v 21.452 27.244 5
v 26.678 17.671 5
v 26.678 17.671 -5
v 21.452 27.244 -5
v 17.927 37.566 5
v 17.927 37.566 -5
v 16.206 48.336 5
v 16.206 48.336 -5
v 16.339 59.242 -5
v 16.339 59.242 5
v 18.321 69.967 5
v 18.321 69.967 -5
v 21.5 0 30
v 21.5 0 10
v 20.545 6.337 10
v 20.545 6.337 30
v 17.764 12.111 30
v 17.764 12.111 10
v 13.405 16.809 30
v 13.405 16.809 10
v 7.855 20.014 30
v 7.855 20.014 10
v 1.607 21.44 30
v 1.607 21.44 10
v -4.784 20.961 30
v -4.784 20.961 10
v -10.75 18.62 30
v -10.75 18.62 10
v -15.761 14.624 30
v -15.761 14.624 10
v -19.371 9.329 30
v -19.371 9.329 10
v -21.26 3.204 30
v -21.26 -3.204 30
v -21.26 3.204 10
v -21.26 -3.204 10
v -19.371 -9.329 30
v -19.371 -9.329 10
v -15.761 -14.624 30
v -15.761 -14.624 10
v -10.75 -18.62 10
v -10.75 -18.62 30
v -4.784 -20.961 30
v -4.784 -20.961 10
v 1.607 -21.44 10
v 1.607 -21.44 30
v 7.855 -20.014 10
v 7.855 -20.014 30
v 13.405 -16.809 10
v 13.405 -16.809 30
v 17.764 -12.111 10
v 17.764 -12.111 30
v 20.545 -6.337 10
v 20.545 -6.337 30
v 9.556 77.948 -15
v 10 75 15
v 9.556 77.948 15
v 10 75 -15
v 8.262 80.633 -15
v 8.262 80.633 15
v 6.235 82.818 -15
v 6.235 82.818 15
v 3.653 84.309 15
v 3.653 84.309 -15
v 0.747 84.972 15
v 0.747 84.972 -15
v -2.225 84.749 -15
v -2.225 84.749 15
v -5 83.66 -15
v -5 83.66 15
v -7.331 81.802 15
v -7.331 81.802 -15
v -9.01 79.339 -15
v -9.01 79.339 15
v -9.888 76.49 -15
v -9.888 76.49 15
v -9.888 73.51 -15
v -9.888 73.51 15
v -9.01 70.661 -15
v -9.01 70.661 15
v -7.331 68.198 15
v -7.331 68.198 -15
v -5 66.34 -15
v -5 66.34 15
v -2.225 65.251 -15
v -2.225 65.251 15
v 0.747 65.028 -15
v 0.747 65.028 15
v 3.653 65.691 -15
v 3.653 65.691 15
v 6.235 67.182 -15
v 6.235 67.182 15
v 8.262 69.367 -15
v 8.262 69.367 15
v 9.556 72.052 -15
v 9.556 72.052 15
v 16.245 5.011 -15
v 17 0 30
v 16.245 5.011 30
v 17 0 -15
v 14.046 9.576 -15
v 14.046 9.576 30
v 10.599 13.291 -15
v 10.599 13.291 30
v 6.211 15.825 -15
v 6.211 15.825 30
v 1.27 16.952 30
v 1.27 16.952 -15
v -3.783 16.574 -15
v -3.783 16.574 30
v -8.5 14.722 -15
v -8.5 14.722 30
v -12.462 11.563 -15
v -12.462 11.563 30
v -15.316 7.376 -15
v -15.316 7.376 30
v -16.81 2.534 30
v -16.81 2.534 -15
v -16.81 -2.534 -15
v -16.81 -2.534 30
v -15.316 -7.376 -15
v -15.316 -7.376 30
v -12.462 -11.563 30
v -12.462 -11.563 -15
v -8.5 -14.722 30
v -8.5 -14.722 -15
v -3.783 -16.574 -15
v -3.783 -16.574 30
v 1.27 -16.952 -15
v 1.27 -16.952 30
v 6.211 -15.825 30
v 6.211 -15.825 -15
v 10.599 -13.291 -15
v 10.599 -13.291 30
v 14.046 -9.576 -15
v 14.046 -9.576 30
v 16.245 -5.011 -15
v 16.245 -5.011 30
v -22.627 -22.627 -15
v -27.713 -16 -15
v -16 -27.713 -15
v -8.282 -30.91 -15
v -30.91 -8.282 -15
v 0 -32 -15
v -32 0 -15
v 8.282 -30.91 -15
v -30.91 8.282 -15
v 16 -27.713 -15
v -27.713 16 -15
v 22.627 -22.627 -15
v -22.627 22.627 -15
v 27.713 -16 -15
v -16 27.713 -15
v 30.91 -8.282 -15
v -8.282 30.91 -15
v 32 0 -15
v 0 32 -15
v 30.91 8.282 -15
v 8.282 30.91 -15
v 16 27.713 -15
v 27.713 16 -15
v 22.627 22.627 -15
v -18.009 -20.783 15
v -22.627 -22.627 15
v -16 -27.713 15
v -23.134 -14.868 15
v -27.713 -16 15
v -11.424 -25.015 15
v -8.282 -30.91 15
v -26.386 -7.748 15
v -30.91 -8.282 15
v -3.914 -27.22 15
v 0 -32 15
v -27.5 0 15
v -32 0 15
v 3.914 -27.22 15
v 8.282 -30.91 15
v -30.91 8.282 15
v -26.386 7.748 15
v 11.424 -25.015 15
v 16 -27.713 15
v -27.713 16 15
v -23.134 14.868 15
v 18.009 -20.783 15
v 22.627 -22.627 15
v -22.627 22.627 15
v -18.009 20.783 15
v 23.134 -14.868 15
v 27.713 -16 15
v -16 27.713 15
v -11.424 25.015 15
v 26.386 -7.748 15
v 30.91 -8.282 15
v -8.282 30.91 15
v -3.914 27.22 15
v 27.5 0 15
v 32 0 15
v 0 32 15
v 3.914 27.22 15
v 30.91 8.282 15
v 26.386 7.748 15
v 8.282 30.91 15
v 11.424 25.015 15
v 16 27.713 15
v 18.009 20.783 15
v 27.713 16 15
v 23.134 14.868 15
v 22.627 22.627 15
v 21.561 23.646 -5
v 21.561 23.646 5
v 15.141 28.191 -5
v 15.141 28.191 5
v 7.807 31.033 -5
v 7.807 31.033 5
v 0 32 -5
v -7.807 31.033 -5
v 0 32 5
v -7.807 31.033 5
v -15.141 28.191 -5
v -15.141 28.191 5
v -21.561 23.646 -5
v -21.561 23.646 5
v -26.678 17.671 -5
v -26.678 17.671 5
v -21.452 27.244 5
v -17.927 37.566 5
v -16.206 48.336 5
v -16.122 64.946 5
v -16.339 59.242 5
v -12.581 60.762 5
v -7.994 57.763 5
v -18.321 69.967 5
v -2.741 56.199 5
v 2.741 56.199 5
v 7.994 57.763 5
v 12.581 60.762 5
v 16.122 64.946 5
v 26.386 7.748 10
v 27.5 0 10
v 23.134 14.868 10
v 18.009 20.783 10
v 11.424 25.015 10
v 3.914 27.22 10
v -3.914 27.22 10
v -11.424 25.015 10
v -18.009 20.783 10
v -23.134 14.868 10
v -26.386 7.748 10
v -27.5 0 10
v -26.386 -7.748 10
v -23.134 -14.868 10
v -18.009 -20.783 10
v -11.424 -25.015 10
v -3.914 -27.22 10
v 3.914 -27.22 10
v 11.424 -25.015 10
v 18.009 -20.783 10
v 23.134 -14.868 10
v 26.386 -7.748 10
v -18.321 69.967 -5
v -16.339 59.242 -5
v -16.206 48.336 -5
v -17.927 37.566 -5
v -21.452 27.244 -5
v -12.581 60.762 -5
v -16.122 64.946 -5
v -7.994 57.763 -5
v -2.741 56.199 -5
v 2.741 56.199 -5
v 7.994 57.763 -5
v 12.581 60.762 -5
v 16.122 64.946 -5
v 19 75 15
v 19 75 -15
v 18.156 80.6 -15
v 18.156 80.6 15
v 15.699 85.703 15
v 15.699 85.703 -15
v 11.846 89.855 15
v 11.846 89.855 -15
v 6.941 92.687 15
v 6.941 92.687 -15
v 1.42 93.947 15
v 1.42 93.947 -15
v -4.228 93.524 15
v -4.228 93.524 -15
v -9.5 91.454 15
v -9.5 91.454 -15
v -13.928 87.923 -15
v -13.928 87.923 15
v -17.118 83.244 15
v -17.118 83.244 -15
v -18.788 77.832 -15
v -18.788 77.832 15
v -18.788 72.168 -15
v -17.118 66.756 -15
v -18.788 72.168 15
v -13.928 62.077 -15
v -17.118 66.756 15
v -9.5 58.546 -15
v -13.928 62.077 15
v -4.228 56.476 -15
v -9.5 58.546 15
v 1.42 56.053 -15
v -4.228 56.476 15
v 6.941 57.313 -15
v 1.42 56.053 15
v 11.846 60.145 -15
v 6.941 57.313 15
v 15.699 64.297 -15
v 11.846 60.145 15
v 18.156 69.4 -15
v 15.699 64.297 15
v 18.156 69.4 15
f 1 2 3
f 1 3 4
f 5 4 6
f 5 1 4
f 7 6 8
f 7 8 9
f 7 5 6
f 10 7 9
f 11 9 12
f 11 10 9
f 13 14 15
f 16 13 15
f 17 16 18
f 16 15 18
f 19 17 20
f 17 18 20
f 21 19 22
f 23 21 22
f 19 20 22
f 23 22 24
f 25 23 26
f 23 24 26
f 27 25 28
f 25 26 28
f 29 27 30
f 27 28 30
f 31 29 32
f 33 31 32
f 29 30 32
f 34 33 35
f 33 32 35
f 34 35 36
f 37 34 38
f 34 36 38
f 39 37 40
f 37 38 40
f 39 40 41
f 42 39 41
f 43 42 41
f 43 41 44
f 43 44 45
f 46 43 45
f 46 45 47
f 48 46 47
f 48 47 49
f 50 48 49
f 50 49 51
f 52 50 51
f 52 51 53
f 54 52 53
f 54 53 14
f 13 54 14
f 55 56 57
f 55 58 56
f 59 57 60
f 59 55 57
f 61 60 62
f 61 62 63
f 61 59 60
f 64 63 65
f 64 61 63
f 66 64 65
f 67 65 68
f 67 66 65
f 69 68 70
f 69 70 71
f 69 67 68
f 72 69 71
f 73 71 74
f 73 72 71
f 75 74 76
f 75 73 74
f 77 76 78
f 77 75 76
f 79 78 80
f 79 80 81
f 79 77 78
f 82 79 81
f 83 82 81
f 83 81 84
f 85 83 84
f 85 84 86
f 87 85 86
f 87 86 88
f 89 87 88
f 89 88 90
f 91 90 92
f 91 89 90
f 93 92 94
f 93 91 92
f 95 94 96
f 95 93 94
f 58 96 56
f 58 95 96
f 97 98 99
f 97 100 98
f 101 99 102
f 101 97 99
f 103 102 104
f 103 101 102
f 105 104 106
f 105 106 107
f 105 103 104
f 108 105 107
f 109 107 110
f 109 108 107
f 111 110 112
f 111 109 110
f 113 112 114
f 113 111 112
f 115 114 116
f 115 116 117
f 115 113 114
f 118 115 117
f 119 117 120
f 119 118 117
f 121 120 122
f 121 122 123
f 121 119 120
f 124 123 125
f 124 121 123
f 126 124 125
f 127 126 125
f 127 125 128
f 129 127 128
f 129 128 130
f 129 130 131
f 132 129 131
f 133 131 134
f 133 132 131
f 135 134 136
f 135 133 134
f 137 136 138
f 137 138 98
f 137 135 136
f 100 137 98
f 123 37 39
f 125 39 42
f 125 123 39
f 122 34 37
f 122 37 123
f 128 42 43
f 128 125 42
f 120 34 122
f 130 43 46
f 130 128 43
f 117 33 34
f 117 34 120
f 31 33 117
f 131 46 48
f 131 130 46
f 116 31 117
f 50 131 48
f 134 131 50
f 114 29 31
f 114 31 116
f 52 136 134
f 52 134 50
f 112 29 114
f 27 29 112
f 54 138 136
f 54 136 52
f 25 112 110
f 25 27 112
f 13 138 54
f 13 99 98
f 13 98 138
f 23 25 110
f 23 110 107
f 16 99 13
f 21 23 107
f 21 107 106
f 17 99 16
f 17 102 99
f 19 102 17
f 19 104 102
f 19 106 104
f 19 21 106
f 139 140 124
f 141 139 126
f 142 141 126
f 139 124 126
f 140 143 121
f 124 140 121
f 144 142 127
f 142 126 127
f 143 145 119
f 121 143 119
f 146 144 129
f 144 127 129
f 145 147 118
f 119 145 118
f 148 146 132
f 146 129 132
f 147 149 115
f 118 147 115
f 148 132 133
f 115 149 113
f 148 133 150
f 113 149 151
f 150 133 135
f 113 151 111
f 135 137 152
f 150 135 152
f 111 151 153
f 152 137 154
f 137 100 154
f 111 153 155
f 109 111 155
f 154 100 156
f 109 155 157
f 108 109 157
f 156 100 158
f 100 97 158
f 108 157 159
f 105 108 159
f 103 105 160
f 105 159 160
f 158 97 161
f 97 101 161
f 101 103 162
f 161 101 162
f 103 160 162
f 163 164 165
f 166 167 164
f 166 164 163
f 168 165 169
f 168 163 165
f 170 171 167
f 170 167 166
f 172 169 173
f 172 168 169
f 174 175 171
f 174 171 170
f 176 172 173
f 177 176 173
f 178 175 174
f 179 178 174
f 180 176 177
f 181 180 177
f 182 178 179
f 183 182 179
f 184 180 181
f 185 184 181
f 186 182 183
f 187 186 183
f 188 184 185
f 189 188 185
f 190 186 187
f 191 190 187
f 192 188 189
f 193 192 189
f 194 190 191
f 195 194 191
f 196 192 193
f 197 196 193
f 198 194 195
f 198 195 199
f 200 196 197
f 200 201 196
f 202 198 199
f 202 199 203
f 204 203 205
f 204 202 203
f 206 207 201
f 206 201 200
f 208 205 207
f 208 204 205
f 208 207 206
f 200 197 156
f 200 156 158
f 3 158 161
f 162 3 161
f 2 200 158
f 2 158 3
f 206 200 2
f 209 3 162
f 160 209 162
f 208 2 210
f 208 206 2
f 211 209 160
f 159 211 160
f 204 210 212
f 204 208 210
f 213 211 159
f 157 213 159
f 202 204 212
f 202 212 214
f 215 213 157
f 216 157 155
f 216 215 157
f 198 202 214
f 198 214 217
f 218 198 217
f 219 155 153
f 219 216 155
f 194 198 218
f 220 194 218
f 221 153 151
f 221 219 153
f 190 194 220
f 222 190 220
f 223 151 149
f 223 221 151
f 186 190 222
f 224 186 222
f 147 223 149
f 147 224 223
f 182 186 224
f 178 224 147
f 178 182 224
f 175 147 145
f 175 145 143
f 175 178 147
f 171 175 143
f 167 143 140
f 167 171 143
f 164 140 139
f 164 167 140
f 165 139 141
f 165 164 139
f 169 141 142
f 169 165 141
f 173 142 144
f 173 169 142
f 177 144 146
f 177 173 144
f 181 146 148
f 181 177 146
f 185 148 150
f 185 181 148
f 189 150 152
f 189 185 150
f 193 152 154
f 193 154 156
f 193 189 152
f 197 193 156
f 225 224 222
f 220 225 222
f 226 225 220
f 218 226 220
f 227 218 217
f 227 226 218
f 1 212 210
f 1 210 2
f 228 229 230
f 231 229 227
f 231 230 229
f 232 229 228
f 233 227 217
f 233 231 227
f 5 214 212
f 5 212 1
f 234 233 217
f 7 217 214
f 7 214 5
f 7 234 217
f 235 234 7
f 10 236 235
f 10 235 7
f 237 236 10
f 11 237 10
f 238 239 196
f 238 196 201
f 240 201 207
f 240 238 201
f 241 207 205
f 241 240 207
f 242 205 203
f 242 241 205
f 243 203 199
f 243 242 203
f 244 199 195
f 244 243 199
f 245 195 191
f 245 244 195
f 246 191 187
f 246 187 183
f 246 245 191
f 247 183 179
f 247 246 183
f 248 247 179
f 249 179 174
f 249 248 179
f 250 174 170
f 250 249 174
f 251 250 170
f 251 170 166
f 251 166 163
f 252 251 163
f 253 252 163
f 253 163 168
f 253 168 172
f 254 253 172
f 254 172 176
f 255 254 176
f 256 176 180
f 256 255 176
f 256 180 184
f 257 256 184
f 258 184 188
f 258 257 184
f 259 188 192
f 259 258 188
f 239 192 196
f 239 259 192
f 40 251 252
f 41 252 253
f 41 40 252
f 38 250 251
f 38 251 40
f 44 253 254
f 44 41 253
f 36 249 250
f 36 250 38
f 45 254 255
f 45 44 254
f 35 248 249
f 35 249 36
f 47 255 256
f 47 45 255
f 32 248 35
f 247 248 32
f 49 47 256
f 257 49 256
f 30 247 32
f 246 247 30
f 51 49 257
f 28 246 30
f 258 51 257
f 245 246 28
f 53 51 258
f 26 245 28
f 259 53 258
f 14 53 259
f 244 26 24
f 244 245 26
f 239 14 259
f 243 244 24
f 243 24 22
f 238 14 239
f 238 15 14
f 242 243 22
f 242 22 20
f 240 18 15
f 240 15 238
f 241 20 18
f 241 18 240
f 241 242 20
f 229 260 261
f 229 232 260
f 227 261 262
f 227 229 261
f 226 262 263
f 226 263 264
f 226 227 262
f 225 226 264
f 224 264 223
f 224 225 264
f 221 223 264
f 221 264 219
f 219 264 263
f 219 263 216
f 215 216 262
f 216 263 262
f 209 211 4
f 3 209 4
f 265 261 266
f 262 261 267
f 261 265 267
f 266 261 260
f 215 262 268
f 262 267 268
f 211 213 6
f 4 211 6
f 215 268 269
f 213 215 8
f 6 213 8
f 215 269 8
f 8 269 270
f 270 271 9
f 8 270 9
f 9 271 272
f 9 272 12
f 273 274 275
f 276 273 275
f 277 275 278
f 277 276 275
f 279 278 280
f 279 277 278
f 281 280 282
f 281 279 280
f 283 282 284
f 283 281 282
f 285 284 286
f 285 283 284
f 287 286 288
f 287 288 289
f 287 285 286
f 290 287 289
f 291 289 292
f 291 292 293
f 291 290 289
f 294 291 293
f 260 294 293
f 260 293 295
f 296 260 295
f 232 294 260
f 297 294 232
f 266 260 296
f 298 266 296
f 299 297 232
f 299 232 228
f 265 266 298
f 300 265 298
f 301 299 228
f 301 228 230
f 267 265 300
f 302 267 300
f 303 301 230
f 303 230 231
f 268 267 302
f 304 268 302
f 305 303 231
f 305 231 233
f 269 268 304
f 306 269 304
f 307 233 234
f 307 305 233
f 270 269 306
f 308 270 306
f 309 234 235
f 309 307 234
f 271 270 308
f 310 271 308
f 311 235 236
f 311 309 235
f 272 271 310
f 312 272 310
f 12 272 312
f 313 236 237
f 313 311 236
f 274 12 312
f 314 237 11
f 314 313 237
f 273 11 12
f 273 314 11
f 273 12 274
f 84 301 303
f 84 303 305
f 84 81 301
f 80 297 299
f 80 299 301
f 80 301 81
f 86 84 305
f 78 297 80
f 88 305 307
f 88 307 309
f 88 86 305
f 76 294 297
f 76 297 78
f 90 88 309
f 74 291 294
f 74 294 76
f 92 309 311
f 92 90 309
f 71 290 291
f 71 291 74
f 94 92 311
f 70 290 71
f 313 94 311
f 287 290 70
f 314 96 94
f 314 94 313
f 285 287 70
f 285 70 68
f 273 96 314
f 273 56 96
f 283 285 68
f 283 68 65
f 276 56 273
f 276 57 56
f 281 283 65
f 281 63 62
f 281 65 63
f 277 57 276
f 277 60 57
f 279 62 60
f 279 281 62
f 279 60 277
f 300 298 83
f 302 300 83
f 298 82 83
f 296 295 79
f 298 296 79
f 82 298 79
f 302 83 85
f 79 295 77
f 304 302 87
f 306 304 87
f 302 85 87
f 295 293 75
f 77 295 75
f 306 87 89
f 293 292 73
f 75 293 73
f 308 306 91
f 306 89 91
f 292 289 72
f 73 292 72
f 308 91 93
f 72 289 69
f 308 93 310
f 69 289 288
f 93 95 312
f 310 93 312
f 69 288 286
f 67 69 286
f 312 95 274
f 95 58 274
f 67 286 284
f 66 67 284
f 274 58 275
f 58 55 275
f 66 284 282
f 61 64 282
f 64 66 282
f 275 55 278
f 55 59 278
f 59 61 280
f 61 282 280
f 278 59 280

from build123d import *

# Parameters (mm, degrees)
BOSS_EXTRU_1_DEPTH      = 5
ESQUISSE1_3_R           = 10
BOSS_EXTRU_2_DEPTH      = 15
BOSS_EXTRU_3_DEPTH      = 30
BOSS_EXTRU_3_DEPTH_BACK = 15
ESQUISSE1_5_R           = 21.5
ESQUISSE1_5_R_2         = 17
ESQUISSE1_6_R           = 32
ESQUISSE1_6_R_2         = 21.5
BOSS_EXTRU_4_DEPTH      = 15
ENL_V_START             = 10
ESQUISSE1_7_R           = 27.5
ESQUISSE1_7_R_2         = 21.5
ENL_V_MAT_EXTRU_1_DEPTH = 5


with BuildPart() as part:
    # Esquisse1 → Boss.-Extru.1 (new, symmetric)
    with BuildSketch(Plane.XY):
        with BuildLine():
            ThreePointArc((-26.678302647, 17.671111111), (0, 32), (26.678302647, 17.671111111))
            ThreePointArc((26.678302647, 17.671111111), (16.836772686, 42.914041255), (18.321243986, 69.966907631))
            ThreePointArc((18.321243986, 69.966907631), (0, 56), (-18.321243986, 69.966907631))
            ThreePointArc((-18.321243986, 69.966907631), (-16.836772686, 42.914041255), (-26.678302647, 17.671111111))
        make_face()
    extrude(amount=BOSS_EXTRU_1_DEPTH, both=True)

    # Esquisse1_3 → Boss.-Extru.2 (add, symmetric)
    with BuildSketch(Plane.XY):
        with BuildLine():
            ThreePointArc((-18.321243986, 69.966907631), (0, 56), (18.321243986, 69.966907631))
            ThreePointArc((18.321243986, 69.966907631), (18.829546406, 72.460672898), (19, 75))
            ThreePointArc((19, 75), (-2.539327102, 93.829546406), (-18.321243986, 69.966907631))
        make_face()
        with Locations((0, 75)):
            Circle(ESQUISSE1_3_R, mode=Mode.SUBTRACT)
    extrude(amount=BOSS_EXTRU_2_DEPTH, both=True)



with BuildPart() as body_2:
    # Esquisse1_5 → Boss.-Extru.3 (new, two sides: drawn at the far end of the back side and taken through both)
    with BuildSketch(Plane.XY.offset(-BOSS_EXTRU_3_DEPTH_BACK)):
        Circle(ESQUISSE1_5_R)
        Circle(ESQUISSE1_5_R_2, mode=Mode.SUBTRACT)
    extrude(amount=BOSS_EXTRU_3_DEPTH + BOSS_EXTRU_3_DEPTH_BACK)


with BuildPart() as part_1:
    add(part.part)

    add(body_2.part)  # Boss.-Extru.4 merges body 2
    # Esquisse1_6 → Boss.-Extru.4 (add, symmetric)
    with BuildSketch(Plane.XY):
        Circle(ESQUISSE1_6_R)
        Circle(ESQUISSE1_6_R_2, mode=Mode.SUBTRACT)
    extrude(amount=BOSS_EXTRU_4_DEPTH, both=True)

    # Esquisse1_7 → Enl_v. mat.-Extru.1 (cut)
    with BuildSketch(Plane.XY.offset(ENL_V_START)):
        Circle(ESQUISSE1_7_R)
        Circle(ESQUISSE1_7_R_2, mode=Mode.SUBTRACT)
    extrude(amount=ENL_V_MAT_EXTRU_1_DEPTH, mode=Mode.SUBTRACT)


solid = part_1.part
